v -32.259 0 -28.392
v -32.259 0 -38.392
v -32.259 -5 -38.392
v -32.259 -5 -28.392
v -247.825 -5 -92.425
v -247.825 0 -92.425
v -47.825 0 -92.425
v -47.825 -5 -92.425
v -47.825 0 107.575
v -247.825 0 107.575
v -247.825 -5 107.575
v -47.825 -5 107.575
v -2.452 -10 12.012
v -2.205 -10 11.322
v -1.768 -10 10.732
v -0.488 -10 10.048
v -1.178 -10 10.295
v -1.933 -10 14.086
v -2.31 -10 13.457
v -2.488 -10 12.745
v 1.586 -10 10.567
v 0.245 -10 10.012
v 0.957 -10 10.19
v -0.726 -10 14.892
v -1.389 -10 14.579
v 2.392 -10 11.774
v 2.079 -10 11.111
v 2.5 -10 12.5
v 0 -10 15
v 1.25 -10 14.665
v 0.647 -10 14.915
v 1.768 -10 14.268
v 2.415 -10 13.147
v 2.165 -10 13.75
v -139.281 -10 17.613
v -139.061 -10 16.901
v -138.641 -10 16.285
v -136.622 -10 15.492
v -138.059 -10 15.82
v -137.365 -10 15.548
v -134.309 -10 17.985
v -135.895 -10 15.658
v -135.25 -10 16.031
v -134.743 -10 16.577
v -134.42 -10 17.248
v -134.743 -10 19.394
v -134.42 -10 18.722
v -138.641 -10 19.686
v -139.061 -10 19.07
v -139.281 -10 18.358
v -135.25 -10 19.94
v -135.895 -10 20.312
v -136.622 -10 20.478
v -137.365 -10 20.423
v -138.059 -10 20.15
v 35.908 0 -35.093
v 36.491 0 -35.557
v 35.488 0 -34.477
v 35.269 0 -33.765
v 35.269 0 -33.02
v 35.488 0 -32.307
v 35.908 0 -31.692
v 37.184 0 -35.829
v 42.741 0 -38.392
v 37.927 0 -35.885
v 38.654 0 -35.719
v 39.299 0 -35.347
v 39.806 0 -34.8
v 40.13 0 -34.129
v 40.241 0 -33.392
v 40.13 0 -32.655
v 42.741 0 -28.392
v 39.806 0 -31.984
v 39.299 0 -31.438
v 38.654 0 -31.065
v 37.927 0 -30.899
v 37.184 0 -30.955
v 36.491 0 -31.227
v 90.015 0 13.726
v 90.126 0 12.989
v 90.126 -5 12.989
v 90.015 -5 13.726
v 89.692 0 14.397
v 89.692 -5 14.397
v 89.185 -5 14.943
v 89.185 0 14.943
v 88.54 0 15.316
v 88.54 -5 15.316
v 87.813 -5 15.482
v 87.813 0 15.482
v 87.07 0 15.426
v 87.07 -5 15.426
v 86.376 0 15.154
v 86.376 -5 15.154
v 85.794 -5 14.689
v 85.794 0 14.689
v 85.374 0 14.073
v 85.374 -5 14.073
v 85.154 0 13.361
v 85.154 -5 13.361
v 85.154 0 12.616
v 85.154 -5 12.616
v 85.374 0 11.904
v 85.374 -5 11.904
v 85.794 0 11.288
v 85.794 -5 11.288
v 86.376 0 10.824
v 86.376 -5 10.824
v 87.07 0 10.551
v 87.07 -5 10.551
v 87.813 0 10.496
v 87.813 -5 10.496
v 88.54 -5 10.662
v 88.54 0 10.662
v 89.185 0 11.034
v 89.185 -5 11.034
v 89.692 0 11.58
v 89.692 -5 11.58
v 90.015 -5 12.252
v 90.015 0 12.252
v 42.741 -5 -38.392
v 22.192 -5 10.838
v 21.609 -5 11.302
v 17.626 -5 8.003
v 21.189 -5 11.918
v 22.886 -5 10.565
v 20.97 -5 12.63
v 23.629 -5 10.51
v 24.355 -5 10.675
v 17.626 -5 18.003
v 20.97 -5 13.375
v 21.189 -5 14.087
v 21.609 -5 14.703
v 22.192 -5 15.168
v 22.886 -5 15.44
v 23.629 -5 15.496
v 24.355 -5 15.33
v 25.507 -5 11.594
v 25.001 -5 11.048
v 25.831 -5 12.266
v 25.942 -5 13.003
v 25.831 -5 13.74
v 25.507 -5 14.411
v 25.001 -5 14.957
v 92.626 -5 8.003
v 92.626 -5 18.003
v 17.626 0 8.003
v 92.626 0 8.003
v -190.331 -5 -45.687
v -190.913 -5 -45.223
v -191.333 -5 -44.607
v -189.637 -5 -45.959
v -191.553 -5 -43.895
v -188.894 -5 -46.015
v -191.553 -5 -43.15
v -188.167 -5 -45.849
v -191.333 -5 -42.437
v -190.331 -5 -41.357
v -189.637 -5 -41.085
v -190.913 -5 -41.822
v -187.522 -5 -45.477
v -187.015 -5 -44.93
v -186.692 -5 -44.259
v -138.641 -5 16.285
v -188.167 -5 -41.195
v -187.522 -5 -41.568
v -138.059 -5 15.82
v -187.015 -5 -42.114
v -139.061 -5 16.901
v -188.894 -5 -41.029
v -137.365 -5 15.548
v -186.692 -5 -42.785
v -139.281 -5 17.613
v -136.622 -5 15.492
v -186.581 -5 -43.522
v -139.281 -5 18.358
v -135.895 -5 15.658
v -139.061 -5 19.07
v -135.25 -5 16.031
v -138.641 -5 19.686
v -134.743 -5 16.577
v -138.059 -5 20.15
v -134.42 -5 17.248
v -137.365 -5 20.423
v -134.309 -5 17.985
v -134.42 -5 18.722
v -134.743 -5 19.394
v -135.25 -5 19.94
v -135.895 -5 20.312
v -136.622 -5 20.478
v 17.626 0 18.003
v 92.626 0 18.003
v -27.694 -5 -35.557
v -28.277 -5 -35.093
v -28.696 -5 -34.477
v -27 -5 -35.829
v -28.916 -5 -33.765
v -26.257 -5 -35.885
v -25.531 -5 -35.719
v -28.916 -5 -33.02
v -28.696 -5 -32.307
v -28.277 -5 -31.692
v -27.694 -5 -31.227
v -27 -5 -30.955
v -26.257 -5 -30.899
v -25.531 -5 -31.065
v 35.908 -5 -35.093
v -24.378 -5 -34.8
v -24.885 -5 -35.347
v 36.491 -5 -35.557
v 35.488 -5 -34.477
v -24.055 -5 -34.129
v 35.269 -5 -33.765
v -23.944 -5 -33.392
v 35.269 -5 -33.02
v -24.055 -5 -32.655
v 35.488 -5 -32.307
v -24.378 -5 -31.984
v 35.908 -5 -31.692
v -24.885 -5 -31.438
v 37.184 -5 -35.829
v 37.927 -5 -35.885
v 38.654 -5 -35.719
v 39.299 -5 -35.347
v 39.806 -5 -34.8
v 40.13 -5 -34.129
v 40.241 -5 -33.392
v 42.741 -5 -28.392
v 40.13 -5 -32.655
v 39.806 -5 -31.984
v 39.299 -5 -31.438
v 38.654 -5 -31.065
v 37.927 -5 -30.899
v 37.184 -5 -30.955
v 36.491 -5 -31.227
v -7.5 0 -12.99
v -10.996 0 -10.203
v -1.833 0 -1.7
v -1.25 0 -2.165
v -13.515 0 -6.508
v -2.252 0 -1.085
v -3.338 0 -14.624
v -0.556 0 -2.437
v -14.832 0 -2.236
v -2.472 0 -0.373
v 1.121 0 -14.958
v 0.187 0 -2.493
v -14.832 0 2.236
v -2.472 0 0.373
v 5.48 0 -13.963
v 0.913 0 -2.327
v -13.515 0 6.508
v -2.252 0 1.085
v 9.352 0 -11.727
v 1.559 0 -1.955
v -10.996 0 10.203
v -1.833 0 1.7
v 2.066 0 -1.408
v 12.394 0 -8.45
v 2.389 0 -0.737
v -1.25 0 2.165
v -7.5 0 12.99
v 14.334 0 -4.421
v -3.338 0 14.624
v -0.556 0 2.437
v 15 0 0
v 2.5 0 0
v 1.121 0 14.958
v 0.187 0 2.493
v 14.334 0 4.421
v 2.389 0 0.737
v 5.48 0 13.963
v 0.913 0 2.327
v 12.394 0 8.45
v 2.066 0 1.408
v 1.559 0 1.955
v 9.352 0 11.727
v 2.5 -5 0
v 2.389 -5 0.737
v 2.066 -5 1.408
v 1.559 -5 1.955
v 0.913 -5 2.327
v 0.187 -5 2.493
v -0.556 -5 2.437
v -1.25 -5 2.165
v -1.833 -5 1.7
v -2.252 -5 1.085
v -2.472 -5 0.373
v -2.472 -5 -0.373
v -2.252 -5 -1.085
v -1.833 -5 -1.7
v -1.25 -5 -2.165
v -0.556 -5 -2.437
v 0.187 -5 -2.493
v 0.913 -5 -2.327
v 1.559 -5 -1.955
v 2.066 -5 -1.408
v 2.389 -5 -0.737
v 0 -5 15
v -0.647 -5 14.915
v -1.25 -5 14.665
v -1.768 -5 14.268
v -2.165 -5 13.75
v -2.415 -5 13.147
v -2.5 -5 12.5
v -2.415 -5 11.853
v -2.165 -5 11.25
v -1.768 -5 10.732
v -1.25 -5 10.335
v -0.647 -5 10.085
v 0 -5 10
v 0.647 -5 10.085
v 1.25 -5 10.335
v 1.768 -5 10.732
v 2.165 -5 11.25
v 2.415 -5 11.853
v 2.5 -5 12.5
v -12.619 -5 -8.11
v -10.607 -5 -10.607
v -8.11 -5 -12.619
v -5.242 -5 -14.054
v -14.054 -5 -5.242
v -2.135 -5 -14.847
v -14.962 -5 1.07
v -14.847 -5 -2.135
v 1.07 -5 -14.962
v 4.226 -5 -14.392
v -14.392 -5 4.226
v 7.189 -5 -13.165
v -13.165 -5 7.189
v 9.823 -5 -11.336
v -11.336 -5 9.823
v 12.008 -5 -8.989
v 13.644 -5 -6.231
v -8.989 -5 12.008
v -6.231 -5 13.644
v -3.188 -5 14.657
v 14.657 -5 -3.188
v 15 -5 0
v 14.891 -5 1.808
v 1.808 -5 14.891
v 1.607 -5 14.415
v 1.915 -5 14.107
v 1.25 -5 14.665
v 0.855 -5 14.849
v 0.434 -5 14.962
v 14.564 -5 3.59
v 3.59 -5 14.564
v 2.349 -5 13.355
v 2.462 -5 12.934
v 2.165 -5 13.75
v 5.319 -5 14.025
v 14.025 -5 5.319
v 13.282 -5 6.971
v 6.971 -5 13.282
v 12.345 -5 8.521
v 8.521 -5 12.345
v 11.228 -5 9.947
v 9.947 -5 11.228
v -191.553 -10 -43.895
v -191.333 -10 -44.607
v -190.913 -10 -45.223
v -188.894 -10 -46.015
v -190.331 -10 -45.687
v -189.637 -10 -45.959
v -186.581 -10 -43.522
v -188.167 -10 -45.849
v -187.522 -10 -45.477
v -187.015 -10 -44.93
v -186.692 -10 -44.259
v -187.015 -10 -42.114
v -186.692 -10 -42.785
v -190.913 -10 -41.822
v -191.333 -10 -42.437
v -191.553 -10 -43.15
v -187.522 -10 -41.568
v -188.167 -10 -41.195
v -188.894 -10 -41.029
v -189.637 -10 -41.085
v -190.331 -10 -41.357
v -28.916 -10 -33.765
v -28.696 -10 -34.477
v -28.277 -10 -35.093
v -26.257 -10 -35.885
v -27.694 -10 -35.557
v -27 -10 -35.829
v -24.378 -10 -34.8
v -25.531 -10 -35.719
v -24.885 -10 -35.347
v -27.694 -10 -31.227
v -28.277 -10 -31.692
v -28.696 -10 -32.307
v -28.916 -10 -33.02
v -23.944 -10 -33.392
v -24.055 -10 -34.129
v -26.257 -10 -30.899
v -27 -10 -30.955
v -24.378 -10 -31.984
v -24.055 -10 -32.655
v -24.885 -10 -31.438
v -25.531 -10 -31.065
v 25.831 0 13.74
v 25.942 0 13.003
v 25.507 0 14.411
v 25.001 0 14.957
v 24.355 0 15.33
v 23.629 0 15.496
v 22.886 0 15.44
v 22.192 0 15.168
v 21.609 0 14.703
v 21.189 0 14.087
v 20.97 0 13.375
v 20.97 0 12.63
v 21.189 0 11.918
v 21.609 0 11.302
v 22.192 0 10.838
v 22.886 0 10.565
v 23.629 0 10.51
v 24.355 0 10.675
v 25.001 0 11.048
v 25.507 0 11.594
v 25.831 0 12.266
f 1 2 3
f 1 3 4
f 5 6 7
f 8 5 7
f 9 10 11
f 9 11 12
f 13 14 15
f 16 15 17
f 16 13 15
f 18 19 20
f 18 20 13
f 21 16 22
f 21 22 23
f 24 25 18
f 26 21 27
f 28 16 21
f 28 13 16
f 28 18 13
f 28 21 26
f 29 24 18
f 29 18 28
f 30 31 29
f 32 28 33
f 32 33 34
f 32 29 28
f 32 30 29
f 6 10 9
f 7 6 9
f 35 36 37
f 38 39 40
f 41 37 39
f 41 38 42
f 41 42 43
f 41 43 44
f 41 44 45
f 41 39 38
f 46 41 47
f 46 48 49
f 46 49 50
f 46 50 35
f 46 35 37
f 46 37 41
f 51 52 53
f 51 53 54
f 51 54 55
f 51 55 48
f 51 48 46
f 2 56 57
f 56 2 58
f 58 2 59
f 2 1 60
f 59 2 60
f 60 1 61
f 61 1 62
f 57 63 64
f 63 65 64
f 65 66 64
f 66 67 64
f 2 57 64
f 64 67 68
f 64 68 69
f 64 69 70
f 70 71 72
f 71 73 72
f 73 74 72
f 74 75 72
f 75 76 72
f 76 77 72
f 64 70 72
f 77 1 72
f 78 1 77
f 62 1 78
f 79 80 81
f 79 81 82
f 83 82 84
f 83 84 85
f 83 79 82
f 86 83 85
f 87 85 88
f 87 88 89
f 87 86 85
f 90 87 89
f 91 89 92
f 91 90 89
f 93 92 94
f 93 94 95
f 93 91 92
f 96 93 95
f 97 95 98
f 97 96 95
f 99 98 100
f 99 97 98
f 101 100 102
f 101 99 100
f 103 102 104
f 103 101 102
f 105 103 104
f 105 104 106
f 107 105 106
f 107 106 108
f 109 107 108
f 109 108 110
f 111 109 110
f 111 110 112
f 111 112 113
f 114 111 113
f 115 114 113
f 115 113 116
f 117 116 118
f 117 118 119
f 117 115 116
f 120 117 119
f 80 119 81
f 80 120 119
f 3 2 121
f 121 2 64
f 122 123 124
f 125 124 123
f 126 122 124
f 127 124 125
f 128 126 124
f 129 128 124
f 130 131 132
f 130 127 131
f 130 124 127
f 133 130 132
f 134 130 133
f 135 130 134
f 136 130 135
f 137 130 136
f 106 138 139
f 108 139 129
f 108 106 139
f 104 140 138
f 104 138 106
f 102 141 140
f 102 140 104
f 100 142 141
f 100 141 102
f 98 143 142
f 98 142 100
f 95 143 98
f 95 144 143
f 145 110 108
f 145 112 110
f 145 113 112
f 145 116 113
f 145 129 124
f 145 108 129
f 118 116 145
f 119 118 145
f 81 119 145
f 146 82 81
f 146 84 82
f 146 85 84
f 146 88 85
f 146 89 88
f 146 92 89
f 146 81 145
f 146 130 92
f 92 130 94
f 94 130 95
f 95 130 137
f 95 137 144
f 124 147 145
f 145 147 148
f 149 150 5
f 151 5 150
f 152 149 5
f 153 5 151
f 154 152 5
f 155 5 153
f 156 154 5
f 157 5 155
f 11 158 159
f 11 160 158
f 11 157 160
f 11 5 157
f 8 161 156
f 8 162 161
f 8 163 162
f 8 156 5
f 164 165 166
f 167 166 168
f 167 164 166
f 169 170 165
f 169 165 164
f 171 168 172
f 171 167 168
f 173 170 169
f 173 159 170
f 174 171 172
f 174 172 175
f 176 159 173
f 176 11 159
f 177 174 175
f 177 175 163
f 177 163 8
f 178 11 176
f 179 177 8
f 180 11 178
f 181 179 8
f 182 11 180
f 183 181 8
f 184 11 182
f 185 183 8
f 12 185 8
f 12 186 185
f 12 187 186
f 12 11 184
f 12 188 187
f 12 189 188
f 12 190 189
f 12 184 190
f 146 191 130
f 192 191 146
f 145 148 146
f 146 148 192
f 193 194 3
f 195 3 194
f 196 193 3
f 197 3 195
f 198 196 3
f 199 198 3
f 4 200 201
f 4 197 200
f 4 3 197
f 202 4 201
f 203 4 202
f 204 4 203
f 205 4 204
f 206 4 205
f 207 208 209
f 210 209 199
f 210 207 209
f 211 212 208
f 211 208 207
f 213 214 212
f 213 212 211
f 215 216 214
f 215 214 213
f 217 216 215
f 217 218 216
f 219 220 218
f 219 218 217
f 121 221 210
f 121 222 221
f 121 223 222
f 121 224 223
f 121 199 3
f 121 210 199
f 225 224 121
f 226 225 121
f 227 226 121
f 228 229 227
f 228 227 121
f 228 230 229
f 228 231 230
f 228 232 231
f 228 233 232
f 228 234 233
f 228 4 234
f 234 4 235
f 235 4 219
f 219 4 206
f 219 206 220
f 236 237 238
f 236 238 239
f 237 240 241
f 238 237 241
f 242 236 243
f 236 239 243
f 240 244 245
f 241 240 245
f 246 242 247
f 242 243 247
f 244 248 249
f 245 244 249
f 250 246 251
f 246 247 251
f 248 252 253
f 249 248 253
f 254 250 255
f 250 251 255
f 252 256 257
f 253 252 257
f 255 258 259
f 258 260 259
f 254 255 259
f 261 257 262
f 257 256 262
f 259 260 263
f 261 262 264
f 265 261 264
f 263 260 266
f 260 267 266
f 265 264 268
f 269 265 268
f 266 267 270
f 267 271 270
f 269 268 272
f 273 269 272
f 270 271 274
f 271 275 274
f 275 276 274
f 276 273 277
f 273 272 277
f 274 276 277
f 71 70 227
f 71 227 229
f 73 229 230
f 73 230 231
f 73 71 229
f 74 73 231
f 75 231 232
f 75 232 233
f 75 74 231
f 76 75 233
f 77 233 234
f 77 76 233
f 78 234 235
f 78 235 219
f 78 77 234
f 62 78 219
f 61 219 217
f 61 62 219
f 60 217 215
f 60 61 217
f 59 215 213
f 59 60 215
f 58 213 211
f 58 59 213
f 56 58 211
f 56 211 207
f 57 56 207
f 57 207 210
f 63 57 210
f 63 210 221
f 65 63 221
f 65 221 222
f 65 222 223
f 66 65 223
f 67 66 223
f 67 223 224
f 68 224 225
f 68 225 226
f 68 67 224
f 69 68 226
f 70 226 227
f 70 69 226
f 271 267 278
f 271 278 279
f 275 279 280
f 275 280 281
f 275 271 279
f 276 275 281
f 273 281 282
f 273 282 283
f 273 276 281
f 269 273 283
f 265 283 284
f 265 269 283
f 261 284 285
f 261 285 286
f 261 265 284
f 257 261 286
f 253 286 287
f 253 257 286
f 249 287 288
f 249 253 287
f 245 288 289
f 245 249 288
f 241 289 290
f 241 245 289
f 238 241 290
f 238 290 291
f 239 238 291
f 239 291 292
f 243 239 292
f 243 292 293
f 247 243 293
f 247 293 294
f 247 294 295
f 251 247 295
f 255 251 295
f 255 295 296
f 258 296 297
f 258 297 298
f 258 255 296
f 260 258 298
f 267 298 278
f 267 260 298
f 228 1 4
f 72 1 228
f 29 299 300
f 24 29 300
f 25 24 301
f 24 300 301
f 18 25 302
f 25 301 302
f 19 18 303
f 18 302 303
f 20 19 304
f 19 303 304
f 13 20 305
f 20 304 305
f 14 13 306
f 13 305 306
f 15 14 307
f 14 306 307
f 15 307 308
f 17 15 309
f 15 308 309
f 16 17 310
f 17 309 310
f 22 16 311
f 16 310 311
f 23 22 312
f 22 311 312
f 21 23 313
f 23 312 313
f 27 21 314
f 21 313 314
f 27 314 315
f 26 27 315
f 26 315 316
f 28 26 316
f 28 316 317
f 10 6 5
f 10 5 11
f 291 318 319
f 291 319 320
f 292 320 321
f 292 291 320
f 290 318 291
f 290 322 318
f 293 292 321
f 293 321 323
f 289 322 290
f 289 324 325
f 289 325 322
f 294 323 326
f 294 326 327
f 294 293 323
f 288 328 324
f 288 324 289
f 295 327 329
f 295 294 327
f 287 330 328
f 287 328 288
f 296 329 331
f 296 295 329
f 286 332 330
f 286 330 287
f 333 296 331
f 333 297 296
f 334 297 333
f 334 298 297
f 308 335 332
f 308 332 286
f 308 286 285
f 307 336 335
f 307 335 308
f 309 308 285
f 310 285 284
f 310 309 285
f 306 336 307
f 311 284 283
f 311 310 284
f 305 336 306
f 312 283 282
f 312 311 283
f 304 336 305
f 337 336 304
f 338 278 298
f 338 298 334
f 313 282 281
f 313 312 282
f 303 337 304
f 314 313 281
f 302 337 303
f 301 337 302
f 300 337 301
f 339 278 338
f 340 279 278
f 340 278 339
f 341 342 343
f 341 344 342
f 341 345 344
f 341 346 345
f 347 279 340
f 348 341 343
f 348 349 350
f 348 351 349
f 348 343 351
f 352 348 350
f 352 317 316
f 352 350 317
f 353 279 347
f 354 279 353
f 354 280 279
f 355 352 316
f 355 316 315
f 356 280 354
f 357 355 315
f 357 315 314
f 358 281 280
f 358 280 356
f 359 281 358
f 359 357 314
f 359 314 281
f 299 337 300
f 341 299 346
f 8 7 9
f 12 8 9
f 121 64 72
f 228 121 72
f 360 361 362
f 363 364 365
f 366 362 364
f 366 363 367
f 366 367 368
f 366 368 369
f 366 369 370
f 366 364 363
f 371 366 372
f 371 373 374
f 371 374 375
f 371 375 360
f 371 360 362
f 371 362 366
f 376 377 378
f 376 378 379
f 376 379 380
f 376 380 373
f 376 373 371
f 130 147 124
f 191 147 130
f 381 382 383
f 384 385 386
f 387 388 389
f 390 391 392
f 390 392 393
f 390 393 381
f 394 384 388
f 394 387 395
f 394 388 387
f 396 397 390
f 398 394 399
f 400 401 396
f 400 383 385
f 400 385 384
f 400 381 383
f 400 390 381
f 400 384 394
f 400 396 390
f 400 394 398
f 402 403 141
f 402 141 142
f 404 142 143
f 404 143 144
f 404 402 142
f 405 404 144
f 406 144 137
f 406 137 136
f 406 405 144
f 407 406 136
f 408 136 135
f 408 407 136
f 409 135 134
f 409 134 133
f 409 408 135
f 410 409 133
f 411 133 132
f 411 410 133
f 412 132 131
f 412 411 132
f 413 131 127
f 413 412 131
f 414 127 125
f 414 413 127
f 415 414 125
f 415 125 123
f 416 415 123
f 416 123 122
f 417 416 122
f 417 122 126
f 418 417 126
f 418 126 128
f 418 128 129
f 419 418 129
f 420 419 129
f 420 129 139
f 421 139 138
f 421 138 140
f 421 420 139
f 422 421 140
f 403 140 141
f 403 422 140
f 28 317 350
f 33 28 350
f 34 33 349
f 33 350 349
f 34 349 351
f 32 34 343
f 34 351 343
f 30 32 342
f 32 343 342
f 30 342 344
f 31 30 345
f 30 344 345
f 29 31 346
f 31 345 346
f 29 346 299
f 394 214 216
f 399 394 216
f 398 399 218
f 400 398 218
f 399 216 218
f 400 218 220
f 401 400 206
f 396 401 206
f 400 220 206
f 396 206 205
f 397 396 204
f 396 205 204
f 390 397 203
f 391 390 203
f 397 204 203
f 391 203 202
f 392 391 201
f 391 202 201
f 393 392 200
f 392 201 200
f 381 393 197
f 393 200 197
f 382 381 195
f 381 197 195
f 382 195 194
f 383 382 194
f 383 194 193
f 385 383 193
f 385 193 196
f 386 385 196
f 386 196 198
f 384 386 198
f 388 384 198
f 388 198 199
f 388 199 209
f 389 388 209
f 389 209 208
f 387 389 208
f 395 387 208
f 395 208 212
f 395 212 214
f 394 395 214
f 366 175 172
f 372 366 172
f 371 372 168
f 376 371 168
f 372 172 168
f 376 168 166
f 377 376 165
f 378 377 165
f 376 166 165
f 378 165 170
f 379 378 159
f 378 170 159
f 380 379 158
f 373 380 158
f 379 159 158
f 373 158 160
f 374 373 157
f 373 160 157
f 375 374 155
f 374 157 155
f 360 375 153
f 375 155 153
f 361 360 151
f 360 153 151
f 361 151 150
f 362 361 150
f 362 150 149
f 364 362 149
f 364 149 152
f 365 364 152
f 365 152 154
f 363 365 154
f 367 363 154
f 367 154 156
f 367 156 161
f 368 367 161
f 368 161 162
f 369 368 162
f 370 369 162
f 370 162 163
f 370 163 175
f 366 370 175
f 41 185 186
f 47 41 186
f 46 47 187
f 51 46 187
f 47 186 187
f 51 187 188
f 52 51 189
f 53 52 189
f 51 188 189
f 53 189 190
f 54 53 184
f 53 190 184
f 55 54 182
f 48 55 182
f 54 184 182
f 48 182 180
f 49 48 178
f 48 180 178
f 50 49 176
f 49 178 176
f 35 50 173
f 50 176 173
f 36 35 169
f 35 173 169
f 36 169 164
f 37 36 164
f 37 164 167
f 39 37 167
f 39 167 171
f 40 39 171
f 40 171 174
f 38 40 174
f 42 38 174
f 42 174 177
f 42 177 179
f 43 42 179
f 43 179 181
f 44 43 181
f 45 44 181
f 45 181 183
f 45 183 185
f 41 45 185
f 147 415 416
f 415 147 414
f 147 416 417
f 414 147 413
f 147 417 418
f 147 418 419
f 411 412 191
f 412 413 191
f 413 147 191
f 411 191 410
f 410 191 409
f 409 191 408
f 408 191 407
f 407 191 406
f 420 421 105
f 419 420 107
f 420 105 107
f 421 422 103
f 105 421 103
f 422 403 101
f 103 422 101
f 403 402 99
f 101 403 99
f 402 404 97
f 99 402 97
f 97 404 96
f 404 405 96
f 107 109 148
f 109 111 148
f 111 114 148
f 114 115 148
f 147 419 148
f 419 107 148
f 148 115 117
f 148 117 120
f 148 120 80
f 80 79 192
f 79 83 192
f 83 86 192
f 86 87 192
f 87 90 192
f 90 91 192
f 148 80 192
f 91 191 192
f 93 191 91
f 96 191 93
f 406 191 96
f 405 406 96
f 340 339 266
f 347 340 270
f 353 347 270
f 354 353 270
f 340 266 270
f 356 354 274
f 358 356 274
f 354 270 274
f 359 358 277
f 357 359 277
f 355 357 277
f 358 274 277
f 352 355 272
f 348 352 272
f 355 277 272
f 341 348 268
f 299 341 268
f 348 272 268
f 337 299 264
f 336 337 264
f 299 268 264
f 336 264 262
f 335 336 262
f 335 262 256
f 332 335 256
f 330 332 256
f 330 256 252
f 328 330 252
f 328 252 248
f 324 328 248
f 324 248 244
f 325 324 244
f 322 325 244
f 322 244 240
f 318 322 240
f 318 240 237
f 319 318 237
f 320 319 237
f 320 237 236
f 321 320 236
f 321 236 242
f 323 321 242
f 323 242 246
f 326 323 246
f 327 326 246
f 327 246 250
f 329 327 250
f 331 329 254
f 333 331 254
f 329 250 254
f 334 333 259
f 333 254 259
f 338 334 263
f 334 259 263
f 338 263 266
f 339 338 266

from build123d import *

# Parameters (mm, degrees)
F0_R      = 15
F0_R_2    = 2.5
F1_DEPTH  = 5
F2_W      = 200
F2_H      = 200
F2_R      = 2.5
F3_DEPTH  = 5
F4_DEPTH  = 10
F6_DEPTH  = 5
F7_W      = 75
F7_H      = 10
F7_R      = 2.5
F8_DEPTH  = 5
F9_W      = 75
F9_H      = 10
F9_R      = 2.5
F10_DEPTH = 5
F11_DEPTH = 10
F12_DEPTH = 10


with BuildPart() as f1:
    # F0 (on Front) → F1 (new body)
    with BuildSketch(Plane.XZ):
        Circle(F0_R)
        Circle(F0_R_2, mode=Mode.SUBTRACT)
    extrude(amount=F1_DEPTH)

    # F5 (on face) → F6 (join)
    with BuildSketch(Plane.XZ.offset(5)):
        with BuildLine():
            ThreePointArc((0, 15), (-1.767767, 10.732233), (2.5, 12.5))
            ThreePointArc((2.5, 12.5), (1.767767, 14.267767), (0, 15))
        make_face()
    extrude(amount=F6_DEPTH)


with BuildPart() as f3:
    # F2 (on Front) → F3 (new body)
    with BuildSketch(Plane.XZ):
        with Locations((-147.824606, 7.574737)):
            Rectangle(F2_W, F2_H)
        with Locations((-189.080819, -43.522123)):
            Circle(F2_R, mode=Mode.SUBTRACT)
        with Locations((-136.808515, 17.985249)):
            Circle(F2_R, mode=Mode.SUBTRACT)
    extrude(amount=F3_DEPTH)

    # F2 (on Front) → F4 (join)
    with BuildSketch(Plane.XZ):
        with Locations((-189.080819, -43.522123)):
            Circle(F2_R)
    extrude(amount=F4_DEPTH)

    # F2 (on Front) → F12 (join)
    with BuildSketch(Plane.XZ):
        with Locations((-136.808515, 17.985249)):
            Circle(F2_R)
    extrude(amount=F12_DEPTH)


with BuildPart() as f8:
    # F7 (on Front) → F8 (new body)
    with BuildSketch(Plane.XZ):
        with Locations((55.12644, 13.002621)):
            Rectangle(F7_W, F7_H)
        with Locations((23.441806, 13.002621)):
            Circle(F7_R, mode=Mode.SUBTRACT)
        with Locations((87.62644, 12.988698)):
            Circle(F7_R, mode=Mode.SUBTRACT)
    extrude(amount=F8_DEPTH)


with BuildPart() as f10:
    # F9 (on Front) → F10 (new body)
    with BuildSketch(Plane.XZ):
        with Locations((5.240662, -33.392145)):
            Rectangle(F9_W, F9_H)
        with Locations((-26.443972, -33.392145)):
            Circle(F9_R, mode=Mode.SUBTRACT)
        with Locations((37.740662, -33.392145)):
            Circle(F9_R, mode=Mode.SUBTRACT)
    extrude(amount=F10_DEPTH)

    # F9 (on Front) → F11 (join)
    with BuildSketch(Plane.XZ):
        with Locations((-26.443972, -33.392145)):
            Circle(F9_R)
    extrude(amount=F11_DEPTH)


solid = Compound([f1.part, f3.part, f8.part, f10.part])
